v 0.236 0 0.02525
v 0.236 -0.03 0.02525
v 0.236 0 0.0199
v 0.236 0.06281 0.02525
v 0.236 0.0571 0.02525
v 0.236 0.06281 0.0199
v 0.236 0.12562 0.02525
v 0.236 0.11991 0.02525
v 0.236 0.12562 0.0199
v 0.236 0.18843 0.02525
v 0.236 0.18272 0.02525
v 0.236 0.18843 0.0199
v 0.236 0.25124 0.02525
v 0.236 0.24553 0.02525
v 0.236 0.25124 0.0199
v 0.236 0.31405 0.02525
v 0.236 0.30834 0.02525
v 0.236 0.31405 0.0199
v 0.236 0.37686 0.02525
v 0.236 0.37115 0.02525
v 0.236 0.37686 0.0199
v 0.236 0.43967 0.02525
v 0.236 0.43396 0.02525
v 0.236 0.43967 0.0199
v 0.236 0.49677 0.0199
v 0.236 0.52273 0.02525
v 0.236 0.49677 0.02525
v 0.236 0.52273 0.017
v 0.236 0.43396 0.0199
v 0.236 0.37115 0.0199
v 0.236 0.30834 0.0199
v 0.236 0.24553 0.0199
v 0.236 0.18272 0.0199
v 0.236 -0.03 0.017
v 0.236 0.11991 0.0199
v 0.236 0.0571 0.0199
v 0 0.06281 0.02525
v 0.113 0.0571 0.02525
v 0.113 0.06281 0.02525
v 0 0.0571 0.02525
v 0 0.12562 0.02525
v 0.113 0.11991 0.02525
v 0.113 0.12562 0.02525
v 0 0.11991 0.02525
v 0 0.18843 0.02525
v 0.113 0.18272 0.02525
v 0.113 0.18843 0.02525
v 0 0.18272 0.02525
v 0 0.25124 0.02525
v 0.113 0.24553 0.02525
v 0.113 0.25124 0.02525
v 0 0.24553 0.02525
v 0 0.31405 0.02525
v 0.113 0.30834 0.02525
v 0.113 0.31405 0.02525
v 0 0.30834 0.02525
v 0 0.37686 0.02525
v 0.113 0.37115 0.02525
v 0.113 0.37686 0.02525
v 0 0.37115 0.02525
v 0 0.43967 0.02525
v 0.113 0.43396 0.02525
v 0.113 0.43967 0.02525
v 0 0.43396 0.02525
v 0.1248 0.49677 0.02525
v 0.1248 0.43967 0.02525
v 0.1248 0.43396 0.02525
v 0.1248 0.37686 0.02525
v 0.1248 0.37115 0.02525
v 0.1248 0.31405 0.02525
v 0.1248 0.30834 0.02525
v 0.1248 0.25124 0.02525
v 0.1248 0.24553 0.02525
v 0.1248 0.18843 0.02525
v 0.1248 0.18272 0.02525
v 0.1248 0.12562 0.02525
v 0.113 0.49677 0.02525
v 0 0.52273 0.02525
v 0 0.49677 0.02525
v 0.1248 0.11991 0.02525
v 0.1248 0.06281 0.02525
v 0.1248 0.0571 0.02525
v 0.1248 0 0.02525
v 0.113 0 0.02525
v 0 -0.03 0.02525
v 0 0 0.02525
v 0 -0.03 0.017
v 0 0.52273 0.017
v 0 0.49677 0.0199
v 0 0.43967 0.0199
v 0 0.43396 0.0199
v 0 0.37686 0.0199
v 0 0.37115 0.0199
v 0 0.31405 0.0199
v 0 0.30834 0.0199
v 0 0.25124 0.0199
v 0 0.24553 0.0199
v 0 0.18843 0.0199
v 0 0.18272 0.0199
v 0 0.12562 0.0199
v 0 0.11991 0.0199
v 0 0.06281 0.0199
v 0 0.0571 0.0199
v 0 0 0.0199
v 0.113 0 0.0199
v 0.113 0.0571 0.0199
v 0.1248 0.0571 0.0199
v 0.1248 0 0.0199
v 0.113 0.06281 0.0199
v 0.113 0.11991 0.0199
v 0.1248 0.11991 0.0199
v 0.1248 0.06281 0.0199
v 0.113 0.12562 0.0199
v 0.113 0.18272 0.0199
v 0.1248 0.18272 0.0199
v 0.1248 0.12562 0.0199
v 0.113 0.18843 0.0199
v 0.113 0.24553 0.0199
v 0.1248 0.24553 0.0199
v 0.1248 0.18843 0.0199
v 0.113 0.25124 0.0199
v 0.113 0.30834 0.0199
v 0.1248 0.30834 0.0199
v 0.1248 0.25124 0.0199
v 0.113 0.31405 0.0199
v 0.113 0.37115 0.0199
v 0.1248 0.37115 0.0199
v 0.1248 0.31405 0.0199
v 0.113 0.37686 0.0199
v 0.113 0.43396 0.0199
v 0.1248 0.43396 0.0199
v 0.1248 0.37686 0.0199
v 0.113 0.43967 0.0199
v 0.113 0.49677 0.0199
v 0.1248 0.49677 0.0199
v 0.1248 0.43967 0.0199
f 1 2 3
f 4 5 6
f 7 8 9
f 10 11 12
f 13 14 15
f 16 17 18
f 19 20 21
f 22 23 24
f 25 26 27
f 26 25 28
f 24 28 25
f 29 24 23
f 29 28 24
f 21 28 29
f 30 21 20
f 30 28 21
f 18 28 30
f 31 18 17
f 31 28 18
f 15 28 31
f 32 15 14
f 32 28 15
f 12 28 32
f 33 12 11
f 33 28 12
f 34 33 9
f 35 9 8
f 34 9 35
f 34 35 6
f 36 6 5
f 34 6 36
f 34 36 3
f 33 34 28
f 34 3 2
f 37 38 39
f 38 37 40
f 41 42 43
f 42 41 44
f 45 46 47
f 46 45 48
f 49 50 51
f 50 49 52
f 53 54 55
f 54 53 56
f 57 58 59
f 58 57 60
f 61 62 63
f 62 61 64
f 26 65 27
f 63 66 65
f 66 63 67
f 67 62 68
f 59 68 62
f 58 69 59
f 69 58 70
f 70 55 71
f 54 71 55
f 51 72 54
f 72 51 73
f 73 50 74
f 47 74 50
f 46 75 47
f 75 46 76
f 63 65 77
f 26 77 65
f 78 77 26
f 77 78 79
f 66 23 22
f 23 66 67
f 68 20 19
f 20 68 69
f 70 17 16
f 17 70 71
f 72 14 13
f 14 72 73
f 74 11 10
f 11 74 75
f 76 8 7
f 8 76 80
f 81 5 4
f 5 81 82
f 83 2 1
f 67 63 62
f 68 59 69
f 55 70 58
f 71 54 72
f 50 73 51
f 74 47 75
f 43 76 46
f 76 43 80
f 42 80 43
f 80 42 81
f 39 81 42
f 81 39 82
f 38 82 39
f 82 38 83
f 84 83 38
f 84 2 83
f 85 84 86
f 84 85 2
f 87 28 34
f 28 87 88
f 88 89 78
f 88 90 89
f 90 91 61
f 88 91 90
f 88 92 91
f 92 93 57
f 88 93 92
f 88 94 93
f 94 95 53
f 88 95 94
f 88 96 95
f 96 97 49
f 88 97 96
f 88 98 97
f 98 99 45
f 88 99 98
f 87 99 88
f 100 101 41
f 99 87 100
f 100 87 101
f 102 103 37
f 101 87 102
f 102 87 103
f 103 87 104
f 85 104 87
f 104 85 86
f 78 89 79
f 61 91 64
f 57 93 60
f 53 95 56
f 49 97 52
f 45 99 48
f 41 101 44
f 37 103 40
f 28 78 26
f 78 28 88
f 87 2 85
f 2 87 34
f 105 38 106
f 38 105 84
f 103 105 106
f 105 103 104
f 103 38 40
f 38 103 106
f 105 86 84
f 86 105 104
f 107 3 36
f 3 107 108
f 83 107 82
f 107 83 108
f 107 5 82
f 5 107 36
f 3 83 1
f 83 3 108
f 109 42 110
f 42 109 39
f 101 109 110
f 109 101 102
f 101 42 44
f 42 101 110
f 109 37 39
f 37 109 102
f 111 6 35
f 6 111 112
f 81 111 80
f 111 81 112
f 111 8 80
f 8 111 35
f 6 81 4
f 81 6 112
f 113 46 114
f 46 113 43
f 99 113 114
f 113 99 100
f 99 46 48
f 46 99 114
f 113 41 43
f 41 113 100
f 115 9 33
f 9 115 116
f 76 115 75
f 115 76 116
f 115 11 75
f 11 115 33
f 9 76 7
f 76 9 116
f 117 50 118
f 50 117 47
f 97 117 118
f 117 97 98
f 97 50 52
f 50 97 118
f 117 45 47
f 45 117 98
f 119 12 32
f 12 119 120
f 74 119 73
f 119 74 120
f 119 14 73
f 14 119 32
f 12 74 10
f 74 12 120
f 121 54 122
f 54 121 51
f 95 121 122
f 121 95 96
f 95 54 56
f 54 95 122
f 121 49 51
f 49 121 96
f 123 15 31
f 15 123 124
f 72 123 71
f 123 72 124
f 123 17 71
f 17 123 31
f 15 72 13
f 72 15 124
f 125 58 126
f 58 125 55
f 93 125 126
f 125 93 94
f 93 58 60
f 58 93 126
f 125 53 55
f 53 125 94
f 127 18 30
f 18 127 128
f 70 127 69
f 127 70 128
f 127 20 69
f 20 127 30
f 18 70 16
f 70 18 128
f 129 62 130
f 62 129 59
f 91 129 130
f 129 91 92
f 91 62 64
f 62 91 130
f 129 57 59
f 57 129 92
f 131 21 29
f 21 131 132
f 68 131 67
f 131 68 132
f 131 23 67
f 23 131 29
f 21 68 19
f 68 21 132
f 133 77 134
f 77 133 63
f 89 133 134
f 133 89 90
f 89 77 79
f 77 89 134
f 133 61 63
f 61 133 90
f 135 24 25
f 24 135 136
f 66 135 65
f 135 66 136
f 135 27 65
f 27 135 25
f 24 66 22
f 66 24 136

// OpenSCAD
difference(){
    translate(v=[0, -0.03, 0.017]){
        color("Blue"){
            cube(size=[0.236, 0.5527280000000001, 0.008255]);
        };
    };
    translate(v=[-0.005, 0.0, 0.01989705095577556]){
        cube(size=[0.118, 0.0571, 0.00635]);
    };
    translate(v=[0.1248, 0.0, 0.01989705095577556]){
        cube(size=[0.118, 0.0571, 0.00635]);
    };
    translate(v=[-0.005, 0.06281, 0.01989705095577556]){
        cube(size=[0.118, 0.0571, 0.00635]);
    };
    translate(v=[0.1248, 0.06281, 0.01989705095577556]){
        cube(size=[0.118, 0.0571, 0.00635]);
    };
    translate(v=[-0.005, 0.12562, 0.01989705095577556]){
        cube(size=[0.118, 0.0571, 0.00635]);
    };
    translate(v=[0.1248, 0.12562, 0.01989705095577556]){
        cube(size=[0.118, 0.0571, 0.00635]);
    };
    translate(v=[-0.005, 0.18843000000000001, 0.01989705095577556]){
        cube(size=[0.118, 0.0571, 0.00635]);
    };
    translate(v=[0.1248, 0.18843000000000001, 0.01989705095577556]){
        cube(size=[0.118, 0.0571, 0.00635]);
    };
    translate(v=[-0.005, 0.25124, 0.01989705095577556]){
        cube(size=[0.118, 0.0571, 0.00635]);
    };
    translate(v=[0.1248, 0.25124, 0.01989705095577556]){
        cube(size=[0.118, 0.0571, 0.00635]);
    };
    translate(v=[-0.005, 0.31405000000000005, 0.01989705095577556]){
        cube(size=[0.118, 0.0571, 0.00635]);
    };
    translate(v=[0.1248, 0.31405000000000005, 0.01989705095577556]){
        cube(size=[0.118, 0.0571, 0.00635]);
    };
    translate(v=[-0.005, 0.37686000000000003, 0.01989705095577556]){
        cube(size=[0.118, 0.0571, 0.00635]);
    };
    translate(v=[0.1248, 0.37686000000000003, 0.01989705095577556]){
        cube(size=[0.118, 0.0571, 0.00635]);
    };
    translate(v=[-0.005, 0.43967, 0.01989705095577556]){
        cube(size=[0.118, 0.0571, 0.00635]);
    };
    translate(v=[0.1248, 0.43967, 0.01989705095577556]){
        cube(size=[0.118, 0.0571, 0.00635]);
    };
};
